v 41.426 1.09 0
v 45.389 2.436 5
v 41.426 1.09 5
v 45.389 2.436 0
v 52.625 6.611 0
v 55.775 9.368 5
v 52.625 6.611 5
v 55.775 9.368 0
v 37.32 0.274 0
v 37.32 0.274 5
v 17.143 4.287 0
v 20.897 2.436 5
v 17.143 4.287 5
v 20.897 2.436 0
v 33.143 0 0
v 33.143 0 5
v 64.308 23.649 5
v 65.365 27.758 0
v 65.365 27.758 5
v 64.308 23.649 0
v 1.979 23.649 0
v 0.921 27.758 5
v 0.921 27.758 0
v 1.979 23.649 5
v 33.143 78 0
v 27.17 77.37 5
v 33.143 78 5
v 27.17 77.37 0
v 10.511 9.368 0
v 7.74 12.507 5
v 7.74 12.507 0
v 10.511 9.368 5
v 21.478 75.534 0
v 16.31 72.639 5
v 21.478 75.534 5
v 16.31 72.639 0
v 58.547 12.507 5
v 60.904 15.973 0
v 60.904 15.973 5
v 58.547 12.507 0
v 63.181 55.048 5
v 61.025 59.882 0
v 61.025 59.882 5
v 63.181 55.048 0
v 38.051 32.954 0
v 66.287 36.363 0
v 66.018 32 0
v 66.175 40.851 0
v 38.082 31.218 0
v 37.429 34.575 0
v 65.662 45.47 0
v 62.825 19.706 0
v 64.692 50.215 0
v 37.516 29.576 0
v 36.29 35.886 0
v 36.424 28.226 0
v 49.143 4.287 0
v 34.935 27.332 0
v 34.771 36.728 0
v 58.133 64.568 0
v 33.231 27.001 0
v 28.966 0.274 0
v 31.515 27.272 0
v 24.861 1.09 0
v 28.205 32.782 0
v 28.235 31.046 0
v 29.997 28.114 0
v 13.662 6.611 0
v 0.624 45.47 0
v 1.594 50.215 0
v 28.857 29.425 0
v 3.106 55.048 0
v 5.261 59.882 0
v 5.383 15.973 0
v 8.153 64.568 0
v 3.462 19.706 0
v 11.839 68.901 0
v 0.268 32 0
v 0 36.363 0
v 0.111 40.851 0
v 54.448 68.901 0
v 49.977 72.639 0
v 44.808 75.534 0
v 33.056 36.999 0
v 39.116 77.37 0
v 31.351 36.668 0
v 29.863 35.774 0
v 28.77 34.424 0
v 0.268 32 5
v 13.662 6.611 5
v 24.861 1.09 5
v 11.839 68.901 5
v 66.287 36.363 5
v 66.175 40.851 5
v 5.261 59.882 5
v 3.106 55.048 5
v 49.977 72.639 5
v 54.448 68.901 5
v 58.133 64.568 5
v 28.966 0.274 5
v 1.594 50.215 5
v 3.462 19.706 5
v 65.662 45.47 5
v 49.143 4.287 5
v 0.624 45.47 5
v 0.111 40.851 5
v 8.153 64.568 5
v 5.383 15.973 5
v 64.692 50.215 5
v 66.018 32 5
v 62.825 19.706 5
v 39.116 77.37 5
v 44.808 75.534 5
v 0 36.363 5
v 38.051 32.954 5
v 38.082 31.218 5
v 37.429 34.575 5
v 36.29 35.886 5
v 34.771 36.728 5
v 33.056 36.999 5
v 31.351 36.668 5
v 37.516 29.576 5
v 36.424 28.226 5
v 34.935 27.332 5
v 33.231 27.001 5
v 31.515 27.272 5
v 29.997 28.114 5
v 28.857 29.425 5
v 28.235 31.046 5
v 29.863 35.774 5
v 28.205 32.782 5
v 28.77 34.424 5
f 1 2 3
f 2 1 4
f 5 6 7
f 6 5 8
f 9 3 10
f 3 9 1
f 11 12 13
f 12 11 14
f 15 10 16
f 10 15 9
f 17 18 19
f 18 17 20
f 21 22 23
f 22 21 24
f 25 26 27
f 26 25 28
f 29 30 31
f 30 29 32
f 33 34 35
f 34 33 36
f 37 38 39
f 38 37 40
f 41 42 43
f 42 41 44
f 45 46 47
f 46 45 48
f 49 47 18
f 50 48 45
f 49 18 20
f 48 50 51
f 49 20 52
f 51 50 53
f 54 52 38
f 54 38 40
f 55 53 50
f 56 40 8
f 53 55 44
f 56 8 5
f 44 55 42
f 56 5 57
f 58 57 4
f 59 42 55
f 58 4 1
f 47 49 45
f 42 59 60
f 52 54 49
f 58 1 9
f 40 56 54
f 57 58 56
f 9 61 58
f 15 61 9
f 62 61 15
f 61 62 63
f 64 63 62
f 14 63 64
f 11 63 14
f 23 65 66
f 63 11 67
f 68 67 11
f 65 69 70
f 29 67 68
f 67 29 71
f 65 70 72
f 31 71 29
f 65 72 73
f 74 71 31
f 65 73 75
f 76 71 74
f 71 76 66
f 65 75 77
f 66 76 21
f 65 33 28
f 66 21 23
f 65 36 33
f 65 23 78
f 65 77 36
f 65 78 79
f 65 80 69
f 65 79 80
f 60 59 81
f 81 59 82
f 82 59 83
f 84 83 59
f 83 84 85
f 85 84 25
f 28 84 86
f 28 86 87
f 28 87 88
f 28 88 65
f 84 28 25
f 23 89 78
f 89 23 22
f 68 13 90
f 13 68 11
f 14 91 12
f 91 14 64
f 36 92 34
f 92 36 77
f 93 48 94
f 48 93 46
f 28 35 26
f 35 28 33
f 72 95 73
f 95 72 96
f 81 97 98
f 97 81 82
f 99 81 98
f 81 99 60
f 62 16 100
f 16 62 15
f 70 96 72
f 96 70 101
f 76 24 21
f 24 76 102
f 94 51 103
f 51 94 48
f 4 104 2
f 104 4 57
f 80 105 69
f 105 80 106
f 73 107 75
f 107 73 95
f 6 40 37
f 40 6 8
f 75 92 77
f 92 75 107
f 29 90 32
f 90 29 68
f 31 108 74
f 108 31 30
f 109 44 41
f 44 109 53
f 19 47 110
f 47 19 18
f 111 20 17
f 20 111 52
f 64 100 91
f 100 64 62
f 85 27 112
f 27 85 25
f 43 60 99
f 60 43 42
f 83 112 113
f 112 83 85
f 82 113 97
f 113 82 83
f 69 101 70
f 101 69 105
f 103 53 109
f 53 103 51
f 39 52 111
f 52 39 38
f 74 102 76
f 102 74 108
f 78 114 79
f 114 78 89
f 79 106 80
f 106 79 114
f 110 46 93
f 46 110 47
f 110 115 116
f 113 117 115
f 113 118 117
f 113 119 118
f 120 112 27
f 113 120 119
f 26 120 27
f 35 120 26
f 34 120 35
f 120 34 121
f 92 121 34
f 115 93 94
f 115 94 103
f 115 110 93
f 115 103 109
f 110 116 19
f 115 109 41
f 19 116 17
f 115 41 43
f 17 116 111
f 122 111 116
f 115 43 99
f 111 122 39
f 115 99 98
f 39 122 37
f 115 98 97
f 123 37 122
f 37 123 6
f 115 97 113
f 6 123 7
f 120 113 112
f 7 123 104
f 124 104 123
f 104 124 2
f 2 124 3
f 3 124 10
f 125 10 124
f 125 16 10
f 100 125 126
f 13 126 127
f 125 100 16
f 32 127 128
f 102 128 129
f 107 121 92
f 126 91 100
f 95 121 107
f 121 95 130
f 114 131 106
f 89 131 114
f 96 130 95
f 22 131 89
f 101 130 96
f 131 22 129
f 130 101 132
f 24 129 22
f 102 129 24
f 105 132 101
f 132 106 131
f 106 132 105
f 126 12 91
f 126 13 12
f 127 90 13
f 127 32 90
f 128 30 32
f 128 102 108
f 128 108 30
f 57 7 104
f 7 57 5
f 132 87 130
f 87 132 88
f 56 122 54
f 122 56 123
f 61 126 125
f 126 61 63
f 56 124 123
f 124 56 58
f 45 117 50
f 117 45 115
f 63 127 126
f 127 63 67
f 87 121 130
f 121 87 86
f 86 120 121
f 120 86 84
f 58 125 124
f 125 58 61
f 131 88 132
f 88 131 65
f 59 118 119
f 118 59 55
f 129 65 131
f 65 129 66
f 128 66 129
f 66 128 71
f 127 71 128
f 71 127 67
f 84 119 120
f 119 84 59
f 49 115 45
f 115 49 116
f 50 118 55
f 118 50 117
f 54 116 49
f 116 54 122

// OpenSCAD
$fn = 32;

// ----------------------------------------------------------------------
// Cam plate: single_lobe cam, base R32
// ----------------------------------------------------------------------

// --- parameters (mm) ---
base_r = 32;              // base circle radius
lobe_h = 14;              // cam lobe rise
bore_r = 5;               // shaft bore radius
plate_t = 5;              // plate thickness, Z (extrusion height)

profile = [[66.018, 32], [66.287, 36.363], [66.175, 40.851], [65.662, 45.47], [64.692, 50.215], [63.181, 55.048], [61.025, 59.882], [58.133, 64.568], [54.448, 68.901], [49.977, 72.639], [44.808, 75.534], [39.116, 77.37], [33.143, 78], [27.17, 77.37], [21.478, 75.534], [16.31, 72.639], [11.839, 68.901], [8.153, 64.568], [5.261, 59.882], [3.106, 55.048], [1.594, 50.215], [0.624, 45.47], [0.111, 40.851], [0, 36.363], [0.268, 32], [0.921, 27.758], [1.979, 23.649], [3.462, 19.706], [5.383, 15.973], [7.74, 12.507], [10.511, 9.368], [13.662, 6.611], [17.143, 4.287], [20.897, 2.436], [24.861, 1.09], [28.966, 0.274], [33.143, 0], [37.32, 0.274], [41.426, 1.09], [45.389, 2.436], [49.143, 4.287], [52.625, 6.611], [55.775, 9.368], [58.547, 12.507], [60.904, 15.973], [62.825, 19.706], [64.308, 23.649], [65.365, 27.758]];  // primary outline, 48 points, counter clockwise
void_1 = [[38.051, 32.954], [37.429, 34.575], [36.29, 35.886], [34.771, 36.728], [33.056, 36.999], [31.351, 36.668], [29.863, 35.774], [28.77, 34.424], [28.205, 32.782], [28.235, 31.046], [28.857, 29.425], [29.997, 28.114], [31.515, 27.272], [33.231, 27.001], [34.935, 27.332], [36.424, 28.226], [37.516, 29.576], [38.082, 31.218]];  // shaft bore, 18 points

// --- the one profile operation ---
difference() {
  linear_extrude(height = plate_t) polygon(points = profile);
  translate([0, 0, -1])
    linear_extrude(height = plate_t + 2) polygon(points = void_1);
}
